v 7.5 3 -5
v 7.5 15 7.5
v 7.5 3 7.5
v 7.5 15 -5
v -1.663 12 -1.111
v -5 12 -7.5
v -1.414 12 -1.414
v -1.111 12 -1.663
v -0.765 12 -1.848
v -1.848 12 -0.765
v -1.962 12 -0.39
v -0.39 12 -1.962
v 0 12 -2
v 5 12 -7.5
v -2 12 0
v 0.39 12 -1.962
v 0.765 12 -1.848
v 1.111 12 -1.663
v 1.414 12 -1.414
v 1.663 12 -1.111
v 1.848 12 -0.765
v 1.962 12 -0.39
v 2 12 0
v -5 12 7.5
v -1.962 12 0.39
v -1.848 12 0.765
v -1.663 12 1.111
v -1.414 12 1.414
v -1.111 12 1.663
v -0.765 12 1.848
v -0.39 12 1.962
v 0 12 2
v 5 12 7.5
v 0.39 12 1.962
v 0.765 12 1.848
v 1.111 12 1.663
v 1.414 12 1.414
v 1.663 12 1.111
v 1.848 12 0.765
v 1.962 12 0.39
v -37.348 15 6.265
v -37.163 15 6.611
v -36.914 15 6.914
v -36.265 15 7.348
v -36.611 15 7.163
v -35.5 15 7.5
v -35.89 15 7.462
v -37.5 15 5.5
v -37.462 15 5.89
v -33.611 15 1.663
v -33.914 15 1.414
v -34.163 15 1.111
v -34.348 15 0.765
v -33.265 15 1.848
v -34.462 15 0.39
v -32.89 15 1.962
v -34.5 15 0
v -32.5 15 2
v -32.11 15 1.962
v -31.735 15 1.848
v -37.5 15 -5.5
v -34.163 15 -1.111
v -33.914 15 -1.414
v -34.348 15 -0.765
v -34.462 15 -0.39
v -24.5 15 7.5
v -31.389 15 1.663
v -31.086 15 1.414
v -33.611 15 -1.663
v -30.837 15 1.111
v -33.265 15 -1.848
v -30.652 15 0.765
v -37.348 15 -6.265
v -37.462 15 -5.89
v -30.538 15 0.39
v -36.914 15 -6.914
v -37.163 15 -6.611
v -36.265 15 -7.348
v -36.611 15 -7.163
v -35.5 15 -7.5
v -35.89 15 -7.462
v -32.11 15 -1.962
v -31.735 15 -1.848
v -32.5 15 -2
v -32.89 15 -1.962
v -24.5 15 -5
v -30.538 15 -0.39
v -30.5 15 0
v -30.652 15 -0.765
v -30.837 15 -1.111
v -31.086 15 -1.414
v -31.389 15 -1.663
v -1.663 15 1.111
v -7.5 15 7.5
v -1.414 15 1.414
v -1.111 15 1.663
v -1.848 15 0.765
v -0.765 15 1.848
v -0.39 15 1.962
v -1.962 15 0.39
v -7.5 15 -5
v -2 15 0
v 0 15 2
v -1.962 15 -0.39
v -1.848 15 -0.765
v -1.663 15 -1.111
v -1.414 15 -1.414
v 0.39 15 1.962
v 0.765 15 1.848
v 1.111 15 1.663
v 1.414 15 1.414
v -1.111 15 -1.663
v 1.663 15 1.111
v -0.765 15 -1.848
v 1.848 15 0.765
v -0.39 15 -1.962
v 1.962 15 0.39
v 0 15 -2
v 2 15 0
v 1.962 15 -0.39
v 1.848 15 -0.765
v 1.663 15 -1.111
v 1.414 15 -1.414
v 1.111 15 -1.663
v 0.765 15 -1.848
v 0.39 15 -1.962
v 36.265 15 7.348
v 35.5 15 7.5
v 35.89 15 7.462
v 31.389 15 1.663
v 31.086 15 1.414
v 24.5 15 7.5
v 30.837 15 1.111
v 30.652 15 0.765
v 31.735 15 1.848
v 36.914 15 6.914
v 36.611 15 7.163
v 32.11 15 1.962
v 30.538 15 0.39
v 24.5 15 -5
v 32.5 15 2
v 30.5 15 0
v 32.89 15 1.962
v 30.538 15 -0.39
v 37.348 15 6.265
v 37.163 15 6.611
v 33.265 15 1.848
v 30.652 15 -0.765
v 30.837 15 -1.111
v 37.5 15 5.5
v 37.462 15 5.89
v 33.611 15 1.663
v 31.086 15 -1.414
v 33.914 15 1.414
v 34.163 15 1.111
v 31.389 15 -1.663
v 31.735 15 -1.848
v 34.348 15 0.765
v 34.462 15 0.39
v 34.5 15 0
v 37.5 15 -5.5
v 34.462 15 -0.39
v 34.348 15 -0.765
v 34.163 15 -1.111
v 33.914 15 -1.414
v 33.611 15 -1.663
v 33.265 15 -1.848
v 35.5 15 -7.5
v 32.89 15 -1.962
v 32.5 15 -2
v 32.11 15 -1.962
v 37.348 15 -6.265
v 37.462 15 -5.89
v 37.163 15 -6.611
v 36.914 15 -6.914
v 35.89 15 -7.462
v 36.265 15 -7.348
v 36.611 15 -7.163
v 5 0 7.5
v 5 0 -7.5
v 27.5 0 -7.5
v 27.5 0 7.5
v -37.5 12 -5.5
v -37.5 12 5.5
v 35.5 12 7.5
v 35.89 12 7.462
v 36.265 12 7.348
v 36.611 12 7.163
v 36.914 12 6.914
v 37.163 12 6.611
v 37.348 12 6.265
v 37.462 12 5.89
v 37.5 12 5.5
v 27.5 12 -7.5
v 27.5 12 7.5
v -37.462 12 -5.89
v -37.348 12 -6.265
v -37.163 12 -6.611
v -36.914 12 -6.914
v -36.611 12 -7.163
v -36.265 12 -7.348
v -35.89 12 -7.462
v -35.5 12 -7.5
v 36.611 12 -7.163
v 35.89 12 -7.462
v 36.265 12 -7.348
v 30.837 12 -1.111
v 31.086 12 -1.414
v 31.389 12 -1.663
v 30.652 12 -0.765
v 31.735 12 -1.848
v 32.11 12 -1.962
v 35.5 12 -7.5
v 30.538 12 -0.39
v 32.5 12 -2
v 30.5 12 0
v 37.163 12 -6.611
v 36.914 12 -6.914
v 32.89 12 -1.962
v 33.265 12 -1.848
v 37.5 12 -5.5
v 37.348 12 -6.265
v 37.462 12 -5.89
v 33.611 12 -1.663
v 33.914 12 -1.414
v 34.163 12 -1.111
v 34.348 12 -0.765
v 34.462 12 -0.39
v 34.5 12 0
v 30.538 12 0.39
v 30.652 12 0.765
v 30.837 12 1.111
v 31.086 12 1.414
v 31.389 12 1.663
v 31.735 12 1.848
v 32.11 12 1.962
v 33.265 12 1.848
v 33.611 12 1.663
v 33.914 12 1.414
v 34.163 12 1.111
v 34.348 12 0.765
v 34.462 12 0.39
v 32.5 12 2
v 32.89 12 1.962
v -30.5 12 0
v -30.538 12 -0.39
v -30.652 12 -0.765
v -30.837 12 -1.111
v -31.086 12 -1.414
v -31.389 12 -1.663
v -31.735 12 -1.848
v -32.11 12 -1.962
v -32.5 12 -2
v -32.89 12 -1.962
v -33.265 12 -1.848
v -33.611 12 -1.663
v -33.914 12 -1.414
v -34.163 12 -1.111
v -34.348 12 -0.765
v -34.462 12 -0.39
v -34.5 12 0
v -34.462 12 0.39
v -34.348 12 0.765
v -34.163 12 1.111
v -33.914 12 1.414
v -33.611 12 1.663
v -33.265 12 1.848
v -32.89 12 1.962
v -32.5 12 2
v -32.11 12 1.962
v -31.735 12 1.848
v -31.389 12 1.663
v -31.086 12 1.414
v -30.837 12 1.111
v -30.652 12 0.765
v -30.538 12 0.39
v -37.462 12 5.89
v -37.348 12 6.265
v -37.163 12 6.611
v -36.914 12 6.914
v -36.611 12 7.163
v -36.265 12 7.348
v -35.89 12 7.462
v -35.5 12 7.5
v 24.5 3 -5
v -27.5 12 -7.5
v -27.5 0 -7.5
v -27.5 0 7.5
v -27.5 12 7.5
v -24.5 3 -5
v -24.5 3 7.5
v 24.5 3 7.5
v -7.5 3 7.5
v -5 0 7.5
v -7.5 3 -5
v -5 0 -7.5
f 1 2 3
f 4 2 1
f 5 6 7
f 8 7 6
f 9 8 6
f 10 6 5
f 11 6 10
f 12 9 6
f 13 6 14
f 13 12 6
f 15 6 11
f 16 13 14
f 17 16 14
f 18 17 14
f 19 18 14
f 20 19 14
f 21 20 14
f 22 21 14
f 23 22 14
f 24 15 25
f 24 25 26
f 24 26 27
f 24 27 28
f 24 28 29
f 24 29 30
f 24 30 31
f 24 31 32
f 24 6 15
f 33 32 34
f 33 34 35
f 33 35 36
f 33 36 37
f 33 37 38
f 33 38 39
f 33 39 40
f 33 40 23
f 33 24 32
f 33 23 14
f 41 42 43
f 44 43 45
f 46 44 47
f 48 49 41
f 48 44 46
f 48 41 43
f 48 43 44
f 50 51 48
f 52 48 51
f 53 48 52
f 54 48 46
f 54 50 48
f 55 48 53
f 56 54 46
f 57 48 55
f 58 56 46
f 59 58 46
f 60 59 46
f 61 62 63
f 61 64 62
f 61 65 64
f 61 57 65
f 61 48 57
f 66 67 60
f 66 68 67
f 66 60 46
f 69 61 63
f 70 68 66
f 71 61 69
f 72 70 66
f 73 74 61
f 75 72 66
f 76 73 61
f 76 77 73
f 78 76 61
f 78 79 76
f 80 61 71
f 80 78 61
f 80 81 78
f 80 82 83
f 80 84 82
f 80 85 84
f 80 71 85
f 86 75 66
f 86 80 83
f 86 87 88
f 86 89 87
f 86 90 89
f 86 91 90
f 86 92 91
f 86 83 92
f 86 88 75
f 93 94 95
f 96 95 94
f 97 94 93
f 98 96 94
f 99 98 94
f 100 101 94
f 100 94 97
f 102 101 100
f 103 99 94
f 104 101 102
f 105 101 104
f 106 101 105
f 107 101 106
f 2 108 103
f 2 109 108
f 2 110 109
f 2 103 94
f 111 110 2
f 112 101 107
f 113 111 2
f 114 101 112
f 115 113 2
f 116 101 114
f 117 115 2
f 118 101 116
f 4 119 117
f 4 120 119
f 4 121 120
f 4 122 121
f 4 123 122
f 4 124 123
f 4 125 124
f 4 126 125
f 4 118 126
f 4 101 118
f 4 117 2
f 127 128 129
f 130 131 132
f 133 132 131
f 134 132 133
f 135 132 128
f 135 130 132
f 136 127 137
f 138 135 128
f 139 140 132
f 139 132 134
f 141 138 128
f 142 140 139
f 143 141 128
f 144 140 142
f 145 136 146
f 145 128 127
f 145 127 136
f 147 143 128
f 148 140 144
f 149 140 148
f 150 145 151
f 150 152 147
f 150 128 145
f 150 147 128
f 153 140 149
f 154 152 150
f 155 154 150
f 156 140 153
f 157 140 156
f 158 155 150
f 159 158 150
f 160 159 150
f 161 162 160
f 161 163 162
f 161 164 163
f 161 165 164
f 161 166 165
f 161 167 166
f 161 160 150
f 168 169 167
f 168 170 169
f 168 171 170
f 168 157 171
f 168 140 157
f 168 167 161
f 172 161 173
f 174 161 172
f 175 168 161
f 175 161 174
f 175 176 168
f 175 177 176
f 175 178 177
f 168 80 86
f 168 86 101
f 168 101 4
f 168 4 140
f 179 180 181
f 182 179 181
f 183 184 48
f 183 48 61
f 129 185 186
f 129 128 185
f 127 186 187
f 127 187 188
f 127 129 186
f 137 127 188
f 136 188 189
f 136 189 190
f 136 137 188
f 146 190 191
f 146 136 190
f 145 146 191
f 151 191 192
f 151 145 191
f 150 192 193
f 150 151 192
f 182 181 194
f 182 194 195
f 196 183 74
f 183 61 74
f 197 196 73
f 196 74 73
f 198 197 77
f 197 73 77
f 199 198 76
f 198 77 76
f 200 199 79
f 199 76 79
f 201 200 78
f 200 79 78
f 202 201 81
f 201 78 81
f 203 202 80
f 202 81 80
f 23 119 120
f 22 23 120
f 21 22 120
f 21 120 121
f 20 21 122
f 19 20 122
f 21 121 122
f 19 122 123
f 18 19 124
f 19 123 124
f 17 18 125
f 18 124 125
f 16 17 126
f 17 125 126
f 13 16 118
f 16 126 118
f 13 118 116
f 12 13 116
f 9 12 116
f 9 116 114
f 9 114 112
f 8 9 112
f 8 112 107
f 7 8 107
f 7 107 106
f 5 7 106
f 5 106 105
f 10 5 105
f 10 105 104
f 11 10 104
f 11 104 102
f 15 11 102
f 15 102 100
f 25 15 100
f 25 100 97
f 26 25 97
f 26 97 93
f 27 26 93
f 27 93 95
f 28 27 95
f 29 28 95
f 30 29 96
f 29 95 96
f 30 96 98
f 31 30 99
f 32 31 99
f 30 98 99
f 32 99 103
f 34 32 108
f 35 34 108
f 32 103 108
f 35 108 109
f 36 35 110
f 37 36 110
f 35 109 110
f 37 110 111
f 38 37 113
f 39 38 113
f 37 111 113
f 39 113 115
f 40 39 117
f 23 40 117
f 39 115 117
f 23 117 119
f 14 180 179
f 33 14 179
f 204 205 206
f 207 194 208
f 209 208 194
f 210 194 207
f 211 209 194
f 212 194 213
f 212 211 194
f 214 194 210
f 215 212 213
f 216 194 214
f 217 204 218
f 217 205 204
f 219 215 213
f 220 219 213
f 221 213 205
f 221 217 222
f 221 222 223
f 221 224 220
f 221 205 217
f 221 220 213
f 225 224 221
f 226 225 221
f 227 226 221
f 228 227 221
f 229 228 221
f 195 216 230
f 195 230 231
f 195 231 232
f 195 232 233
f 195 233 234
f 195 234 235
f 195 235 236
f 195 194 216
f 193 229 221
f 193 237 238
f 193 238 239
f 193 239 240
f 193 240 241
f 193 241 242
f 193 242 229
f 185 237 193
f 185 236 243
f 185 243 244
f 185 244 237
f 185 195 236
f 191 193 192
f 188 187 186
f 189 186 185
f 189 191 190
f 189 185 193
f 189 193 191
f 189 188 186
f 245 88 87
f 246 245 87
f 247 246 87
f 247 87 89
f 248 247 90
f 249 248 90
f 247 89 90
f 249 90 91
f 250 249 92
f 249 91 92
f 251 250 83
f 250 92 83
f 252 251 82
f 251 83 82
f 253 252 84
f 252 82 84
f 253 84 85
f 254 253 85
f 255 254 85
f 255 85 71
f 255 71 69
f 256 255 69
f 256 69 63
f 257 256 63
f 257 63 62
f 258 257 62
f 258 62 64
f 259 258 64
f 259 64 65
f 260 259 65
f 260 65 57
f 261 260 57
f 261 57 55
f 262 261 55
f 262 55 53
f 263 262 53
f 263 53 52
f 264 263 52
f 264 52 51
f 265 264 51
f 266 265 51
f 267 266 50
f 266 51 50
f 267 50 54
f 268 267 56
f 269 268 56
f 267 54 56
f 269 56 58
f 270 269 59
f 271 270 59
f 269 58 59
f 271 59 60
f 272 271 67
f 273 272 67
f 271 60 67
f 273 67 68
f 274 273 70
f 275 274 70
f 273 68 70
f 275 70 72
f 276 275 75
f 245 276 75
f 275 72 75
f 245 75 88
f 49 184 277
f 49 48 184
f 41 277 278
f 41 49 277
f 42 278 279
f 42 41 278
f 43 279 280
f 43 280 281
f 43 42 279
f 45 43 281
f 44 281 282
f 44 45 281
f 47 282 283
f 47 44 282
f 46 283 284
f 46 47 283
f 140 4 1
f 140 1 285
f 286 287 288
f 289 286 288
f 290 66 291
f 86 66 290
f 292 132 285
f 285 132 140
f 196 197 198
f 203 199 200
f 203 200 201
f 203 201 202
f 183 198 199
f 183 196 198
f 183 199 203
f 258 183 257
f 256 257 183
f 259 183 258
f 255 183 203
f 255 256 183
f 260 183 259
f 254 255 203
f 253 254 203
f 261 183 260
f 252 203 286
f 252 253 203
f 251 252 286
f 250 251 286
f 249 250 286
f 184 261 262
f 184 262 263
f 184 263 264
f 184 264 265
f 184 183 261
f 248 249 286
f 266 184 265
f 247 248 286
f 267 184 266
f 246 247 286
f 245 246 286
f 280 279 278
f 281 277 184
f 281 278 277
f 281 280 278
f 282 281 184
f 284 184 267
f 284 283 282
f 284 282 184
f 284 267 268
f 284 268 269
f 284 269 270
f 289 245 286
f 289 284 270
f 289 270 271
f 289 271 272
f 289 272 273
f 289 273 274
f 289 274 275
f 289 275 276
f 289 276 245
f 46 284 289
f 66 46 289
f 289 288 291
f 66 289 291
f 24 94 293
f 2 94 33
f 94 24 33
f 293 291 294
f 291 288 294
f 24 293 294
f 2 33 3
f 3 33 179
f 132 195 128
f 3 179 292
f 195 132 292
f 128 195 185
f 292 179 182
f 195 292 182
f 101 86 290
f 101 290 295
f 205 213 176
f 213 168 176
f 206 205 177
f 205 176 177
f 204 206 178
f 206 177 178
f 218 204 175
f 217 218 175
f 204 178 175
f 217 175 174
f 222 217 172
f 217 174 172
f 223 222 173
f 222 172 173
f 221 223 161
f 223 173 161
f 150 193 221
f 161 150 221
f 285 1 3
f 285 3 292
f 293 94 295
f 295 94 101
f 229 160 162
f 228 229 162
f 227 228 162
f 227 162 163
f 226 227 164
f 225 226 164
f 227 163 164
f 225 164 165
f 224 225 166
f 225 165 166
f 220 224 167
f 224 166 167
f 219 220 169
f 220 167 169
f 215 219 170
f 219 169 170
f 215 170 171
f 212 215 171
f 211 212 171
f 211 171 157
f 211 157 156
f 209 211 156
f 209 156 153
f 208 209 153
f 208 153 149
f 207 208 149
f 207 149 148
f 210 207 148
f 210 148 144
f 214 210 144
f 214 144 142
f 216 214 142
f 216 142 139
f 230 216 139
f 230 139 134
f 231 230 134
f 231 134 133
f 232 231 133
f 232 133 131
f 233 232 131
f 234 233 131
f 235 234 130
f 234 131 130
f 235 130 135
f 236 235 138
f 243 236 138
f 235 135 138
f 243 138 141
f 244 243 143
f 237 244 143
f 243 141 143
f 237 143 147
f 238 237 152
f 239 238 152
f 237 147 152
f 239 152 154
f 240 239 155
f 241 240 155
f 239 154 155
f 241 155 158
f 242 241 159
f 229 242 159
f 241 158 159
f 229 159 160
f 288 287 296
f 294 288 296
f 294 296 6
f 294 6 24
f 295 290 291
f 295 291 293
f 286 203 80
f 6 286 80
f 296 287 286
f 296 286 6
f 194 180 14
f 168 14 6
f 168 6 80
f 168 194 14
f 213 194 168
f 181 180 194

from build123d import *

# Parameters (mm, degrees)
SKETCH1_W             = 75
SKETCH1_H             = 15
BOSS_EXTRUDE1_DEPTH   = 15
SKETCH2_W             = 17
SKETCH2_H             = 12.5
CUT_EXTRUDE1_DEPTH    = 12
SKETCH3_W             = 10
SKETCH3_H             = 15
CUT_EXTRUDE2_DEPTH    = 12
F_4_0MM_DOWEL_HOLE2_D = 4
FILLET1_R             = 2


with BuildPart() as part:
    # Sketch1 → Boss-Extrude1 (new body)
    with BuildSketch(Plane(origin=(0, 0, 0), x_dir=(1, 0, 0), z_dir=(0, 1, 0))):
        Rectangle(SKETCH1_W, SKETCH1_H)
    extrude(amount=BOSS_EXTRUDE1_DEPTH)

    # Sketch2 → Cut-Extrude1 (cut)
    with BuildSketch(Plane(origin=(0, 15, 0), x_dir=(1, 0, 0), z_dir=(0, 1, 0))):
        with Locations((-16, -1.25)):
            Rectangle(SKETCH2_W, SKETCH2_H)
        with Locations((16, -1.25)):
            Rectangle(SKETCH2_W, SKETCH2_H)
    extrude(amount=-CUT_EXTRUDE1_DEPTH, mode=Mode.SUBTRACT)

    # Sketch3 → Cut-Extrude2 (cut)
    with BuildSketch(Plane.XZ):
        with Locations((-32.5, 0)):
            Rectangle(SKETCH3_W, SKETCH3_H)
        with Locations((32.5, 0)):
            Rectangle(SKETCH3_W, SKETCH3_H)
        Rectangle(SKETCH3_W, SKETCH3_H)
    extrude(amount=-CUT_EXTRUDE2_DEPTH, mode=Mode.SUBTRACT)

    # Ø4.0mm Dowel Hole2 (through all)
    with Locations(Plane(origin=(0, 12, 0), x_dir=(-1, 0, 0), z_dir=(0, -1, 0))):
        with Locations((32.5, 0), (0, 0), (-32.5, 0)):
            Hole(F_4_0MM_DOWEL_HOLE2_D / 2)

    # Fillet1
    fillet1_edges = [part.edges().sort_by_distance(p)[0] for p in [
        (-37.5, 13.5, -7.5),
        (37.5, 13.5, -7.5),
        (37.5, 13.5, 7.5),
        (-37.5, 13.5, 7.5),
    ]]
    fillet(fillet1_edges, radius=FILLET1_R)


solid = part.part
